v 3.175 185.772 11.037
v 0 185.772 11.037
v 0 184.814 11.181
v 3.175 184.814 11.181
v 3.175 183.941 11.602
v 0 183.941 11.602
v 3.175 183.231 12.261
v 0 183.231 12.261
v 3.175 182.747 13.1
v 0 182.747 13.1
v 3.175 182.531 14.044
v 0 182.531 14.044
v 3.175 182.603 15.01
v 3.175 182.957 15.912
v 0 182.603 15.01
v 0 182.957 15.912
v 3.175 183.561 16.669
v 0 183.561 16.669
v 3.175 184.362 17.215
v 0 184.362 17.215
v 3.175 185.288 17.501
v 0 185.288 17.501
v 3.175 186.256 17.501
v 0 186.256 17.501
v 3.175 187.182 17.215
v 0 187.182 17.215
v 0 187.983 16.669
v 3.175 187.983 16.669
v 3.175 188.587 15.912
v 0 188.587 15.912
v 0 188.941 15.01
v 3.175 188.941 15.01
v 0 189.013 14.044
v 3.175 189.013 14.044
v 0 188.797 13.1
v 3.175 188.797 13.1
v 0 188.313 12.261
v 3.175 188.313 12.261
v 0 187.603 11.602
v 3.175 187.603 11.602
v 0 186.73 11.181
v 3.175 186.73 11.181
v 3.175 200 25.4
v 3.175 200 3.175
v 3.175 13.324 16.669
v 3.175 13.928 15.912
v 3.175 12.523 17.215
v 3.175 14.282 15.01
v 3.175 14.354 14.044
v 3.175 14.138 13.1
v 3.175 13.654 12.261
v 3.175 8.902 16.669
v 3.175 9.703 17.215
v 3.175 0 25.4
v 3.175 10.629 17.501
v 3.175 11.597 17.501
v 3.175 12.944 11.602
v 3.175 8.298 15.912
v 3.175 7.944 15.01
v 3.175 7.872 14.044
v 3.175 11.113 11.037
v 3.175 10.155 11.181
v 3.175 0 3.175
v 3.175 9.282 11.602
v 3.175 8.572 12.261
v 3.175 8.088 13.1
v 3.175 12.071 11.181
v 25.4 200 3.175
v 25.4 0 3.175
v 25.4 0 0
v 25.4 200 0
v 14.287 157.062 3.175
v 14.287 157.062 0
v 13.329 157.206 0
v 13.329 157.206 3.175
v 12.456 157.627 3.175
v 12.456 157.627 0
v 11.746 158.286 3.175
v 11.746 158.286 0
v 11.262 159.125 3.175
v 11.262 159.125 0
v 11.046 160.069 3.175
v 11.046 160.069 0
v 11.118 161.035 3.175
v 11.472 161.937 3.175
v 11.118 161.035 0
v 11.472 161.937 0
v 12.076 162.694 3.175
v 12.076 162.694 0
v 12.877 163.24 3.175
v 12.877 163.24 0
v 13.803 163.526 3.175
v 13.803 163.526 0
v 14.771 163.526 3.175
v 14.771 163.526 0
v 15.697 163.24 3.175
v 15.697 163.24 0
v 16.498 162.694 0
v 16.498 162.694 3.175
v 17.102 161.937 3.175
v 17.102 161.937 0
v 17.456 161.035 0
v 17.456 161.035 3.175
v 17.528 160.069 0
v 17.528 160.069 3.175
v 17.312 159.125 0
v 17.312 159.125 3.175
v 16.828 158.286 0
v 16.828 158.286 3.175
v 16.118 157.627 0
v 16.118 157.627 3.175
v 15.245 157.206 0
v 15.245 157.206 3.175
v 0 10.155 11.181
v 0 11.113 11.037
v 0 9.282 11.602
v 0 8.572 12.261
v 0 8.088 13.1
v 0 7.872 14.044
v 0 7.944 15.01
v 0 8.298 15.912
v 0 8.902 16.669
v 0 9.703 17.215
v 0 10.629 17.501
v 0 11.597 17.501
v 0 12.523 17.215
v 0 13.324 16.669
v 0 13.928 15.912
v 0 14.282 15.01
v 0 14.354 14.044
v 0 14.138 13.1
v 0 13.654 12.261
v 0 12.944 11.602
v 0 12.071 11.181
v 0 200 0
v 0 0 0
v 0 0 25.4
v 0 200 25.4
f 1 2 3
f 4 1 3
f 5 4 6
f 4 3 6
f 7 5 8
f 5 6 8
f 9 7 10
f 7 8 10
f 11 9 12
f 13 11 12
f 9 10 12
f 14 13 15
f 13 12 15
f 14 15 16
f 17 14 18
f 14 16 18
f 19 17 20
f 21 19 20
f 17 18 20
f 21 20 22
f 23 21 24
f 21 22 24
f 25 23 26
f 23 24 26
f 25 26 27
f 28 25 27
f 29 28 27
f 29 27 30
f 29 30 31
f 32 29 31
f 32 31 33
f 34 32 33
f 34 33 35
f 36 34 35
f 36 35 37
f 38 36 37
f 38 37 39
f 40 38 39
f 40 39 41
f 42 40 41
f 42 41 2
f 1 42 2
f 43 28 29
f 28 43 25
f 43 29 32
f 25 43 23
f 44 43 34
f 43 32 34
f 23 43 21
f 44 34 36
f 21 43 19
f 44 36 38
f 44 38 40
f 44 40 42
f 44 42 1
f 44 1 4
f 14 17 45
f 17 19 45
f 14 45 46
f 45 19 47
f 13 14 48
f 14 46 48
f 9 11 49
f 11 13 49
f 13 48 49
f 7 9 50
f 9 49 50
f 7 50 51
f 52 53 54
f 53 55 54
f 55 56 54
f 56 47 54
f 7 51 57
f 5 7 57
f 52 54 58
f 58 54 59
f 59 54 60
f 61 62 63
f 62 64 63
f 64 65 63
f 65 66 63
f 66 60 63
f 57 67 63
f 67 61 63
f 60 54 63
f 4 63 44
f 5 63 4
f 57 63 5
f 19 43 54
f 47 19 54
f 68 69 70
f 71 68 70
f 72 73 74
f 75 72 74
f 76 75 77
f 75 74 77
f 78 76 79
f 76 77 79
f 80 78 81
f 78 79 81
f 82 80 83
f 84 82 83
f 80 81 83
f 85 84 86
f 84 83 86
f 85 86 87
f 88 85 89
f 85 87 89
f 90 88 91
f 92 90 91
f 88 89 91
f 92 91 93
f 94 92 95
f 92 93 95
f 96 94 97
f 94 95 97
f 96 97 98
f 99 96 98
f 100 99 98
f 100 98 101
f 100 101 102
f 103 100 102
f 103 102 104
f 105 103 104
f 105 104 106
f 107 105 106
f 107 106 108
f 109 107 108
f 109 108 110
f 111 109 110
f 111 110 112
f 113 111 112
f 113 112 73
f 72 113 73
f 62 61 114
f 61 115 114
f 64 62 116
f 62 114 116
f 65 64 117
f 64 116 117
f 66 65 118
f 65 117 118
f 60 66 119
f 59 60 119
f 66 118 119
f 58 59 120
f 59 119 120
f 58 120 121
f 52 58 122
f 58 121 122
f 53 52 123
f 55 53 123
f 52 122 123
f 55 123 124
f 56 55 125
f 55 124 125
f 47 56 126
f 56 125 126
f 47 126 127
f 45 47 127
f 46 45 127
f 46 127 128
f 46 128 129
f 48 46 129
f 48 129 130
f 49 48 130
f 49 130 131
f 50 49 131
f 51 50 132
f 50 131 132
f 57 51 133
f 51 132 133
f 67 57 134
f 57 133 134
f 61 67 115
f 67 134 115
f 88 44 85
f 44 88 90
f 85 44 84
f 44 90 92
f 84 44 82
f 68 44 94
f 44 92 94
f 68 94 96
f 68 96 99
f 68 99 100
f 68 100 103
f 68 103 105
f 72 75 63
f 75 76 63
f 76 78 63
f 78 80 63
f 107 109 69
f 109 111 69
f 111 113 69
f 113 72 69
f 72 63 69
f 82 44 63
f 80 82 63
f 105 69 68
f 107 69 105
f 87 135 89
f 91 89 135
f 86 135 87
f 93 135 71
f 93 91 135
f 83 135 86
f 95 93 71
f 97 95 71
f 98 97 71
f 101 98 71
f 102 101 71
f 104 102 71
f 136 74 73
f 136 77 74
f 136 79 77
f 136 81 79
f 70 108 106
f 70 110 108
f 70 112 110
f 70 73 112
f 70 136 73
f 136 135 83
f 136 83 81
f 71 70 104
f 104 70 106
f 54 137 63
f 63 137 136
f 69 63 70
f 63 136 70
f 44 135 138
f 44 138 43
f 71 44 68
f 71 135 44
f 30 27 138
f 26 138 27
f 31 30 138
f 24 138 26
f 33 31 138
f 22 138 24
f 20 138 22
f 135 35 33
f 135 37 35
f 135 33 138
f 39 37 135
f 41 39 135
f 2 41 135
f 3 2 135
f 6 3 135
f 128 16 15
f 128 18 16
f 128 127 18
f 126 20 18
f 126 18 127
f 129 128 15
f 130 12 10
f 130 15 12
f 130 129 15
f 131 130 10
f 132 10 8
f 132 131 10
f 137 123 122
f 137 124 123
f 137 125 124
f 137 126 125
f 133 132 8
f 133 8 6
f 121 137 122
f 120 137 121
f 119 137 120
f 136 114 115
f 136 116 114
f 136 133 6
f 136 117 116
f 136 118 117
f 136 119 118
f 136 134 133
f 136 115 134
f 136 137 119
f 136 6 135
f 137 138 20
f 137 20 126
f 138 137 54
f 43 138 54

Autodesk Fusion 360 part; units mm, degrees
sketch "Sketch1" plane through (0, 0, 0) normal (0, 1, 0) x (1, 0, 0)
  line L0 (0, -25.4) -> (0, 0)
  line L1 (0, 0) -> (25.4, 0)
  line L2 (12.7, -12.7) -> (11.05, -11.05) construction
  line L3 (3.175, -25.4) -> (3.175, -3.175)
  line L4 (3.175, -3.175) -> (25.4, -3.175)
  line L5 (25.4, -3.175) -> (25.4, 0)
  line L6 (0, -25.4) -> (3.175, -25.4)
  dimension "d1" = 25.4
  dimension "d2" = 25.4
  dimension "d13" = 3.175
extrude "Extrude1" add sketch "Sketch1" along normal blind 200
hole "Hole3" at (3.175, 11.113, 14.287) direction (-1, 0, 0) diameter 6.5 end through all
hole "Hole4" at (3.175, 185.772, 14.287) direction (-1, 0, 0) diameter 6.5 depth 30 tip angle 118
hole "Hole5" at (14.287, 160.312, 3.175) direction (0, 0, -1) diameter 6.5 depth 30 tip angle 118
